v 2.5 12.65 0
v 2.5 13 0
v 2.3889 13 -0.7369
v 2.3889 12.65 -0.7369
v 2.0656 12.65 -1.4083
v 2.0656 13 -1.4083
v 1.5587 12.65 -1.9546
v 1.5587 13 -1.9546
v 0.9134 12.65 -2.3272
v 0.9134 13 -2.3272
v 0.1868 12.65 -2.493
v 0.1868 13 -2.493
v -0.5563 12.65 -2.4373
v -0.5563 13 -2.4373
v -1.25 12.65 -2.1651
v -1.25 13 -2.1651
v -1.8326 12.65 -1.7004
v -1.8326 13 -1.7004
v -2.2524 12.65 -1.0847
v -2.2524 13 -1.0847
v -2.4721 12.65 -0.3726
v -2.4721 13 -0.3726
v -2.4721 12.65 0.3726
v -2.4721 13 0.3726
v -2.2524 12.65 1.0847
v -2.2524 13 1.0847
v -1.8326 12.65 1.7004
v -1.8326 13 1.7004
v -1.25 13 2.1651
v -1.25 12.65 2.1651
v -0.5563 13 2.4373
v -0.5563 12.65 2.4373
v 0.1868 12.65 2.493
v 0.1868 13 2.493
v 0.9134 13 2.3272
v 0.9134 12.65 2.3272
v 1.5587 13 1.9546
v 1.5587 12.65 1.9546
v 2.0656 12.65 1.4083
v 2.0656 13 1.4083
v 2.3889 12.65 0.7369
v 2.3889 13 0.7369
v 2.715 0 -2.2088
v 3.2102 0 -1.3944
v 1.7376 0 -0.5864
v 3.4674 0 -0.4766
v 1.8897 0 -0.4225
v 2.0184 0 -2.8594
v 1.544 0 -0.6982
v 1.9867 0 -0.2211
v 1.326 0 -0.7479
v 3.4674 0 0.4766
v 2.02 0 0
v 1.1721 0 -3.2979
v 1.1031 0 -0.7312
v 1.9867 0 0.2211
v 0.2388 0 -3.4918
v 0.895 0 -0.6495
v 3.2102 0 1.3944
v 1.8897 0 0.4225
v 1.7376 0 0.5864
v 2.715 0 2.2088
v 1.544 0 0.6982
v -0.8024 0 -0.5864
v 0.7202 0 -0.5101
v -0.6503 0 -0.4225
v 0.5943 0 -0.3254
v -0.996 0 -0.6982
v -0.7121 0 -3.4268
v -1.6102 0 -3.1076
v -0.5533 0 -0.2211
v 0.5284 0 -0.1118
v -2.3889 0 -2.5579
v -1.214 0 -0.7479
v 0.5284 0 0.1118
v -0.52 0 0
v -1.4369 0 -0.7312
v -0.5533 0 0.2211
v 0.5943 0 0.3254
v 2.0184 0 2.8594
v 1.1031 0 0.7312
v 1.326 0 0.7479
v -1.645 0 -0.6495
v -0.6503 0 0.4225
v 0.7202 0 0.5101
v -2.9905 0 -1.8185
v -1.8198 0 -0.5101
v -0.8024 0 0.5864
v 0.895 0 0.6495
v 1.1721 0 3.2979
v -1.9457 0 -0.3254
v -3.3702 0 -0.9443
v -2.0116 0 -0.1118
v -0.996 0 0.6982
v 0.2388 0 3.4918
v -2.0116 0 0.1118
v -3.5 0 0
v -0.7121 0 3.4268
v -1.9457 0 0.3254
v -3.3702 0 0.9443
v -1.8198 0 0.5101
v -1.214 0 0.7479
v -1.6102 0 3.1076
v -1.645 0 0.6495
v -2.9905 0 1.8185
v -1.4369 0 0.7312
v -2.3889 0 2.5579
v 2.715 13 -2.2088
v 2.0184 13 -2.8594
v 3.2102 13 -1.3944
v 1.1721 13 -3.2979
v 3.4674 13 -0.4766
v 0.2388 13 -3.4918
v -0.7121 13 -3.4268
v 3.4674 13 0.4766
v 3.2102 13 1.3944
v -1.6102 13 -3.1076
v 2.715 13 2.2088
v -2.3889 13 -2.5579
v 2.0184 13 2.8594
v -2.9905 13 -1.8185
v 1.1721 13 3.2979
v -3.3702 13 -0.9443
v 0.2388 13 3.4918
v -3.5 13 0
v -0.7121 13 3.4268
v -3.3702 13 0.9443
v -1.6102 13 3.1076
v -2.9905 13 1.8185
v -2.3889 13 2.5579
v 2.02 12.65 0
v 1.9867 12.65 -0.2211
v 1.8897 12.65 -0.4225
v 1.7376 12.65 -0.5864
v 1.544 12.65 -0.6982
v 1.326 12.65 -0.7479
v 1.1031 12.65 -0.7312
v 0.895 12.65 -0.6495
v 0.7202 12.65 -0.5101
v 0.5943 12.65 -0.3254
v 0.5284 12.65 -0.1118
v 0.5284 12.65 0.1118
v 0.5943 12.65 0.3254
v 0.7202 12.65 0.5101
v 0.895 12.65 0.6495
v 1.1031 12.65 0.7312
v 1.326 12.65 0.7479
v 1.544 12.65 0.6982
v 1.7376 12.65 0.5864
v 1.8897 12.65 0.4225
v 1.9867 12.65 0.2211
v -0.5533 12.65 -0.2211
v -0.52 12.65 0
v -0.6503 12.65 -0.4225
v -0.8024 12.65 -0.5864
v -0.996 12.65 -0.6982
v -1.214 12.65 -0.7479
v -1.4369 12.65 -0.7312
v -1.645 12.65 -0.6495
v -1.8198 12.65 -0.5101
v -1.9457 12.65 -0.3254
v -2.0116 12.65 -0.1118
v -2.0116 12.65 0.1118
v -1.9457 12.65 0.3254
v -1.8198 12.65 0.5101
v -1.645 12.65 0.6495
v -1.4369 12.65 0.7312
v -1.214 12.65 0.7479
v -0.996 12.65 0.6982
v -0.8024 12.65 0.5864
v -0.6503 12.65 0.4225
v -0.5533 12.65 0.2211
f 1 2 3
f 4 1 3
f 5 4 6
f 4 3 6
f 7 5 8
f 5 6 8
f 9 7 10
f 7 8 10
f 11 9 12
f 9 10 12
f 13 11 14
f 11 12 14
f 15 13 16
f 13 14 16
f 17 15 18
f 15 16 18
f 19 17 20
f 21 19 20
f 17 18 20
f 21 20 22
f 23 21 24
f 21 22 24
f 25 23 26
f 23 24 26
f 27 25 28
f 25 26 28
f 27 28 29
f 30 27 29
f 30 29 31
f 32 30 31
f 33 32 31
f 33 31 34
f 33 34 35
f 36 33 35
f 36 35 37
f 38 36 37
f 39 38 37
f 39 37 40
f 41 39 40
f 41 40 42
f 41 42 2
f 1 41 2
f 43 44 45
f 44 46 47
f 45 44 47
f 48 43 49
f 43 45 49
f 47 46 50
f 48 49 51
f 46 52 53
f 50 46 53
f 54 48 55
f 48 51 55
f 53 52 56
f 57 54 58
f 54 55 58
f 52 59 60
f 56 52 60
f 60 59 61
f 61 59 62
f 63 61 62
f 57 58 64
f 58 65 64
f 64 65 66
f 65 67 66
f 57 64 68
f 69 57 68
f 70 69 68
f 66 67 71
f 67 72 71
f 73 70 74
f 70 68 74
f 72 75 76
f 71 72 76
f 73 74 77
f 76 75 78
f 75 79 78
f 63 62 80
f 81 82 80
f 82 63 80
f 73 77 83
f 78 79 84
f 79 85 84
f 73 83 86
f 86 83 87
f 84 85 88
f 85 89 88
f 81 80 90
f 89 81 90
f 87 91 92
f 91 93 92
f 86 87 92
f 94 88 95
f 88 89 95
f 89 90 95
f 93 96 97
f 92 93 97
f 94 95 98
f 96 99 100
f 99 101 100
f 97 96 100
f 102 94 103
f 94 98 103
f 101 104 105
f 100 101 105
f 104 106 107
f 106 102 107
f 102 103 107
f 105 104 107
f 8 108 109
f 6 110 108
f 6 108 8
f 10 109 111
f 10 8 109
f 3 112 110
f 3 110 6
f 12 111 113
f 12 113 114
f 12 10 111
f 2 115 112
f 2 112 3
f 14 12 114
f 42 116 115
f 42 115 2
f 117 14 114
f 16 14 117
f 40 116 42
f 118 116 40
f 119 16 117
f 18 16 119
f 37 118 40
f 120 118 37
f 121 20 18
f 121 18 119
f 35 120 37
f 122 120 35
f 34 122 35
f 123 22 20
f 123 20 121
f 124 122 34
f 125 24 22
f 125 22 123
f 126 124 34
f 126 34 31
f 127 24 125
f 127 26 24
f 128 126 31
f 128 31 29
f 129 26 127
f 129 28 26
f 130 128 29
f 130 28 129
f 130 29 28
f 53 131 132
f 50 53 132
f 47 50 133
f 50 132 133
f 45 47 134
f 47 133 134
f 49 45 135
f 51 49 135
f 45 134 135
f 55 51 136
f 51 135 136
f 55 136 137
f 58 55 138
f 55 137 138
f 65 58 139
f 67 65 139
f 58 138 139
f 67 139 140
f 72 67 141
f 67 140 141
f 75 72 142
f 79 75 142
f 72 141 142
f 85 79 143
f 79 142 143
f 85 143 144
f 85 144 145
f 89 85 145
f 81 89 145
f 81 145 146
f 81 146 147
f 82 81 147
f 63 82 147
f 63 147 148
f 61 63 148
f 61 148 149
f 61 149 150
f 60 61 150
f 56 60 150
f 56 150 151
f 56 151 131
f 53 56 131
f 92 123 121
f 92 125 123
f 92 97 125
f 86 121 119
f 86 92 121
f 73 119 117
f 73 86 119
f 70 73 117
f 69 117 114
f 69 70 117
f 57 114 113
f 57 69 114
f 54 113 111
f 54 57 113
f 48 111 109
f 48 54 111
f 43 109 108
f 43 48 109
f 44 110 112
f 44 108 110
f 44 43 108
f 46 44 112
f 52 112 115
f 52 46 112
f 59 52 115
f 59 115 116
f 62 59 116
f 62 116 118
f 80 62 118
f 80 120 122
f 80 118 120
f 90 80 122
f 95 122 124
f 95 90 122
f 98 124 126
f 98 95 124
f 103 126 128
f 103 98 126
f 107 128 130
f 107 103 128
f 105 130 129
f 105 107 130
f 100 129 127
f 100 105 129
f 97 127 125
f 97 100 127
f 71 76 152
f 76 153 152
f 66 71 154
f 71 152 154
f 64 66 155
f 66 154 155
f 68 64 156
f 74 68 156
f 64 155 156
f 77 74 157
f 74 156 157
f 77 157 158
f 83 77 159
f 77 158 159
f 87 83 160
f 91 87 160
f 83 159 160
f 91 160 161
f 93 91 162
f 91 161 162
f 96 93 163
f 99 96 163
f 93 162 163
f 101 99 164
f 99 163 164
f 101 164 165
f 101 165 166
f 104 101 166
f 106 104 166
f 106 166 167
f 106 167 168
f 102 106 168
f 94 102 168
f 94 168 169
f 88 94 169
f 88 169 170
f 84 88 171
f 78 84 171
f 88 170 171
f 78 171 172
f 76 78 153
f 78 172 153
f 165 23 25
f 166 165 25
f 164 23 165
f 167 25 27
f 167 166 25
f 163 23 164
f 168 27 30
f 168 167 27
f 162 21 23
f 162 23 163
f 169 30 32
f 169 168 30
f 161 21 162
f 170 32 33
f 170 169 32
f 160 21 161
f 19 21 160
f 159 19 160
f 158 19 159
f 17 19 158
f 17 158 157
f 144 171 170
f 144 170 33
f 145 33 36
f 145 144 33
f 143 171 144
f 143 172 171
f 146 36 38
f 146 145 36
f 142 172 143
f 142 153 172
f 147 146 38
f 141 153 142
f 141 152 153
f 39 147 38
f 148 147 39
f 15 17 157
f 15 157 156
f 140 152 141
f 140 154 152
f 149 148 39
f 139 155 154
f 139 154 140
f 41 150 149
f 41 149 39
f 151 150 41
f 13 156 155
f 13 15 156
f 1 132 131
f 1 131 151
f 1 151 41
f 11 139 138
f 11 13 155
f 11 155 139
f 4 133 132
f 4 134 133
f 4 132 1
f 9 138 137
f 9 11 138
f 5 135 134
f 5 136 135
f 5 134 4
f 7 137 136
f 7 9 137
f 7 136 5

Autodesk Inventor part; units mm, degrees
ref_plane "YZ Plane" through (0, 0, 0) normal (1, 0, 0) x (0, 1, 0)
ref_plane "XZ Plane" through (0, 0, 0) normal (0, 1, 0) x (-1, 0, 0)
ref_plane "XY Plane" through (0, 0, 0) normal (0, 0, 1) x (1, 0, 0)
sketch "Skizze1" plane through (0, 0, 0) normal (0, 1, 0) x (-1, 0, 0)
  circle A0 centre (0, 0) radius 3.5
  dimension "d0" = 7
extrude "Extrusion1" add sketch "Skizze1" along normal blind 13
sketch "Skizze2" plane through (0, 13, 0) normal (0, 1, 0) x (1, 0, 0)
  circle A0 centre (0, 0) radius 2.5
  dimension "d3" = 5
extrude "Extrusion2" cut sketch "Skizze2" against normal blind 0.35
sketch "Skizze3" plane through (0, 12.65, 0) normal (0, 1, 0) x (1, 0, 0)
  line L0 (0, 0) -> (0, 2.5) construction
  circle A0 centre (0, 0) radius 2.5 construction
  circle A1 centre (-1.27, 0) radius 0.75
  circle A2 centre (1.27, 0) radius 0.75
  dimension "d6" = 1.5
  dimension "d7" = 2.54
extrude "Extrusion3" cut sketch "Skizze3" against normal through all
properties part number "Abstandhalter_13mm" material "PC/ABS-Kunststoff"
